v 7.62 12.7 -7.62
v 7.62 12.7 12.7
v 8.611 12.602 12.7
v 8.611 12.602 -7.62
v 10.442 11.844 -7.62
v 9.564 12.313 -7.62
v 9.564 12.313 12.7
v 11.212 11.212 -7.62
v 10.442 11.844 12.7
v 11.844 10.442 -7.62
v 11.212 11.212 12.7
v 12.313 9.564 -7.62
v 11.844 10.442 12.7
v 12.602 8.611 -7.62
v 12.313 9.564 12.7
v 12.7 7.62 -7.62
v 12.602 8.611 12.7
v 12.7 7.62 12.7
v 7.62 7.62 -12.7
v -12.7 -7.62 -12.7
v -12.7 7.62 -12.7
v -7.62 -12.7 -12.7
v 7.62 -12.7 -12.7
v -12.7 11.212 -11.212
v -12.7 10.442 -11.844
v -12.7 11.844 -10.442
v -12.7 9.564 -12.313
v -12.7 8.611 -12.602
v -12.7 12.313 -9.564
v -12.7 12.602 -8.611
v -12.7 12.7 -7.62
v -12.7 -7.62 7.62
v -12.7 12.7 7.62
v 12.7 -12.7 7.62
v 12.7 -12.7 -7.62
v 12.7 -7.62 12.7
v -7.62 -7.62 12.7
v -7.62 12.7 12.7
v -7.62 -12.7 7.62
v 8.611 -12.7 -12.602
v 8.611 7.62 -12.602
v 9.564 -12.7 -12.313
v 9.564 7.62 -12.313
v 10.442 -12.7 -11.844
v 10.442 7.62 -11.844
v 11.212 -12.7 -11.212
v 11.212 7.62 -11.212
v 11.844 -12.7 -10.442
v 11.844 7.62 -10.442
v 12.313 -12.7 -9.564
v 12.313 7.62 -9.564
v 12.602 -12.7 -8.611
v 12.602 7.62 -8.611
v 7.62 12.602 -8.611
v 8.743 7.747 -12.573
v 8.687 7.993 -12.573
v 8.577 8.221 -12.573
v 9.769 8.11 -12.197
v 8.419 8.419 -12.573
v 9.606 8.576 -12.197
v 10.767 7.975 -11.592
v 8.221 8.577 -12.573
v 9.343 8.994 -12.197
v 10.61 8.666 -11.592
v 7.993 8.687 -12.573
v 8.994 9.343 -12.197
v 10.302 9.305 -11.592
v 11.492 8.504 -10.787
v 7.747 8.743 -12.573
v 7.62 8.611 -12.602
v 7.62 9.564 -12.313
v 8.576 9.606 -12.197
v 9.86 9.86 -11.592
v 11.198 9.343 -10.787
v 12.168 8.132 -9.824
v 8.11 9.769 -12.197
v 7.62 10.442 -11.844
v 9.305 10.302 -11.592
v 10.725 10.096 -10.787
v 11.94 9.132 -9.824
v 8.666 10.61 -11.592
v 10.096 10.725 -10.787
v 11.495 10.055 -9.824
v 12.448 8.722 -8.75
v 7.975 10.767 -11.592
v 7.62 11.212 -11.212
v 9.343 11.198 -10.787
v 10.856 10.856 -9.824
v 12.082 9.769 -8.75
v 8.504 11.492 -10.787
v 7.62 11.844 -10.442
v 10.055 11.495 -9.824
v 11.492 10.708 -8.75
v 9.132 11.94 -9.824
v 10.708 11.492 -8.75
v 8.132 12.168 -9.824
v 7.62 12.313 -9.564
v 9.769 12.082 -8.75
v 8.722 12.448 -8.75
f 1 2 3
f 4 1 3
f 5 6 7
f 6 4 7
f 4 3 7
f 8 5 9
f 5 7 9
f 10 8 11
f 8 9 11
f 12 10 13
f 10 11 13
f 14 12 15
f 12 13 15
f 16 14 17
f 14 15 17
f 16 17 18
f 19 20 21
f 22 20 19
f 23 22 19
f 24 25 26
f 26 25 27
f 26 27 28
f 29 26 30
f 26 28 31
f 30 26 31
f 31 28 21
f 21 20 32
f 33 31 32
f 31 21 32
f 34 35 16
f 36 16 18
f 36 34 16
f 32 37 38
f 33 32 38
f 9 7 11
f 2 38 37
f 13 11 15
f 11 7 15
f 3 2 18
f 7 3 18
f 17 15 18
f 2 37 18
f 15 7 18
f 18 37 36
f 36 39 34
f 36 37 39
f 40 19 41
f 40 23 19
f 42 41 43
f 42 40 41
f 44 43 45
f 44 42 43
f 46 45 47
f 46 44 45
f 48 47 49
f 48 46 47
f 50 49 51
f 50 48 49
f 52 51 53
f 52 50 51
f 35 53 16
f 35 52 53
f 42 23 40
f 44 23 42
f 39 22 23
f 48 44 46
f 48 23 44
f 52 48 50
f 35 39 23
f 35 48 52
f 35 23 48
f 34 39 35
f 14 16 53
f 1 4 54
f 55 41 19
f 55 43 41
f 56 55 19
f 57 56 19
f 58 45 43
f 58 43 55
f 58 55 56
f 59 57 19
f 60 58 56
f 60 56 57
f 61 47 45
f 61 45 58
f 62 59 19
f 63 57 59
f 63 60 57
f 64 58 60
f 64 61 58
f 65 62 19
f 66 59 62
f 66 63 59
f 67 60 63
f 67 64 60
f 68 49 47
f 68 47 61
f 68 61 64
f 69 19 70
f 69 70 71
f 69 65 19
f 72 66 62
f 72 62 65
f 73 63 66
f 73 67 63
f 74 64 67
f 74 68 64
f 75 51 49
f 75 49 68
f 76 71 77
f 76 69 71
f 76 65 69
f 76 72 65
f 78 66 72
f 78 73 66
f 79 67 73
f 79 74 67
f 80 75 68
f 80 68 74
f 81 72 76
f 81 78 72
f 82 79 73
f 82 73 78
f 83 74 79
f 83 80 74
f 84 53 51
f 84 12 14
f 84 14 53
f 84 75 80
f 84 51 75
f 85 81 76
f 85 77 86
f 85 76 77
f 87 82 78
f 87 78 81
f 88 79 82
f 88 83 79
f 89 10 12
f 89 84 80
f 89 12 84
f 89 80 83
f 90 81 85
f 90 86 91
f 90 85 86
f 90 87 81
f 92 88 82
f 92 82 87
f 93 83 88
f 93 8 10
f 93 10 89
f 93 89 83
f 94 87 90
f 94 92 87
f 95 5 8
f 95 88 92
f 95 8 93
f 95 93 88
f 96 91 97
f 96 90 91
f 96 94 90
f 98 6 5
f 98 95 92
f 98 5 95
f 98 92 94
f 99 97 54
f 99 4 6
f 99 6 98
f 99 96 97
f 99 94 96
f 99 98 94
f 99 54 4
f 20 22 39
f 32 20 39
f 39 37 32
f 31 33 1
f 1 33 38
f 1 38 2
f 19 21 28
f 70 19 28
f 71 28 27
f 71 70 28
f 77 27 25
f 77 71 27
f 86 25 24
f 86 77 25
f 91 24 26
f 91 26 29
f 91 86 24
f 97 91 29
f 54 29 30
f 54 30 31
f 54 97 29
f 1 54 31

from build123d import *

# Parameters (mm, degrees)
F0_W     = 25.4
F0_H     = 25.4
F1_DEPTH = 12.7
F2_SIZE  = 5.08
F3_R     = 5.08


with BuildPart() as f1:
    # F0 (on Front) → F1 (new body, symmetric)
    with BuildSketch(Plane.XZ):
        Rectangle(F0_W, F0_H)
    extrude(amount=F1_DEPTH, both=True)

    # F2
    f2_edges = [f1.edges().sort_by_distance(p)[0] for p in [
        (0, -12.7, 12.7),
        (-12.7, 0, 12.7),
        (-12.7, -12.7, 0),
    ]]
    chamfer(f2_edges, length=F2_SIZE)

    # F3
    f3_edges = [f1.edges().sort_by_distance(p)[0] for p in [
        (12.7, 12.7, 0),
        (12.7, 0, -12.7),
        (0, 12.7, -12.7),
    ]]
    fillet(f3_edges, radius=F3_R)


solid = f1.part
